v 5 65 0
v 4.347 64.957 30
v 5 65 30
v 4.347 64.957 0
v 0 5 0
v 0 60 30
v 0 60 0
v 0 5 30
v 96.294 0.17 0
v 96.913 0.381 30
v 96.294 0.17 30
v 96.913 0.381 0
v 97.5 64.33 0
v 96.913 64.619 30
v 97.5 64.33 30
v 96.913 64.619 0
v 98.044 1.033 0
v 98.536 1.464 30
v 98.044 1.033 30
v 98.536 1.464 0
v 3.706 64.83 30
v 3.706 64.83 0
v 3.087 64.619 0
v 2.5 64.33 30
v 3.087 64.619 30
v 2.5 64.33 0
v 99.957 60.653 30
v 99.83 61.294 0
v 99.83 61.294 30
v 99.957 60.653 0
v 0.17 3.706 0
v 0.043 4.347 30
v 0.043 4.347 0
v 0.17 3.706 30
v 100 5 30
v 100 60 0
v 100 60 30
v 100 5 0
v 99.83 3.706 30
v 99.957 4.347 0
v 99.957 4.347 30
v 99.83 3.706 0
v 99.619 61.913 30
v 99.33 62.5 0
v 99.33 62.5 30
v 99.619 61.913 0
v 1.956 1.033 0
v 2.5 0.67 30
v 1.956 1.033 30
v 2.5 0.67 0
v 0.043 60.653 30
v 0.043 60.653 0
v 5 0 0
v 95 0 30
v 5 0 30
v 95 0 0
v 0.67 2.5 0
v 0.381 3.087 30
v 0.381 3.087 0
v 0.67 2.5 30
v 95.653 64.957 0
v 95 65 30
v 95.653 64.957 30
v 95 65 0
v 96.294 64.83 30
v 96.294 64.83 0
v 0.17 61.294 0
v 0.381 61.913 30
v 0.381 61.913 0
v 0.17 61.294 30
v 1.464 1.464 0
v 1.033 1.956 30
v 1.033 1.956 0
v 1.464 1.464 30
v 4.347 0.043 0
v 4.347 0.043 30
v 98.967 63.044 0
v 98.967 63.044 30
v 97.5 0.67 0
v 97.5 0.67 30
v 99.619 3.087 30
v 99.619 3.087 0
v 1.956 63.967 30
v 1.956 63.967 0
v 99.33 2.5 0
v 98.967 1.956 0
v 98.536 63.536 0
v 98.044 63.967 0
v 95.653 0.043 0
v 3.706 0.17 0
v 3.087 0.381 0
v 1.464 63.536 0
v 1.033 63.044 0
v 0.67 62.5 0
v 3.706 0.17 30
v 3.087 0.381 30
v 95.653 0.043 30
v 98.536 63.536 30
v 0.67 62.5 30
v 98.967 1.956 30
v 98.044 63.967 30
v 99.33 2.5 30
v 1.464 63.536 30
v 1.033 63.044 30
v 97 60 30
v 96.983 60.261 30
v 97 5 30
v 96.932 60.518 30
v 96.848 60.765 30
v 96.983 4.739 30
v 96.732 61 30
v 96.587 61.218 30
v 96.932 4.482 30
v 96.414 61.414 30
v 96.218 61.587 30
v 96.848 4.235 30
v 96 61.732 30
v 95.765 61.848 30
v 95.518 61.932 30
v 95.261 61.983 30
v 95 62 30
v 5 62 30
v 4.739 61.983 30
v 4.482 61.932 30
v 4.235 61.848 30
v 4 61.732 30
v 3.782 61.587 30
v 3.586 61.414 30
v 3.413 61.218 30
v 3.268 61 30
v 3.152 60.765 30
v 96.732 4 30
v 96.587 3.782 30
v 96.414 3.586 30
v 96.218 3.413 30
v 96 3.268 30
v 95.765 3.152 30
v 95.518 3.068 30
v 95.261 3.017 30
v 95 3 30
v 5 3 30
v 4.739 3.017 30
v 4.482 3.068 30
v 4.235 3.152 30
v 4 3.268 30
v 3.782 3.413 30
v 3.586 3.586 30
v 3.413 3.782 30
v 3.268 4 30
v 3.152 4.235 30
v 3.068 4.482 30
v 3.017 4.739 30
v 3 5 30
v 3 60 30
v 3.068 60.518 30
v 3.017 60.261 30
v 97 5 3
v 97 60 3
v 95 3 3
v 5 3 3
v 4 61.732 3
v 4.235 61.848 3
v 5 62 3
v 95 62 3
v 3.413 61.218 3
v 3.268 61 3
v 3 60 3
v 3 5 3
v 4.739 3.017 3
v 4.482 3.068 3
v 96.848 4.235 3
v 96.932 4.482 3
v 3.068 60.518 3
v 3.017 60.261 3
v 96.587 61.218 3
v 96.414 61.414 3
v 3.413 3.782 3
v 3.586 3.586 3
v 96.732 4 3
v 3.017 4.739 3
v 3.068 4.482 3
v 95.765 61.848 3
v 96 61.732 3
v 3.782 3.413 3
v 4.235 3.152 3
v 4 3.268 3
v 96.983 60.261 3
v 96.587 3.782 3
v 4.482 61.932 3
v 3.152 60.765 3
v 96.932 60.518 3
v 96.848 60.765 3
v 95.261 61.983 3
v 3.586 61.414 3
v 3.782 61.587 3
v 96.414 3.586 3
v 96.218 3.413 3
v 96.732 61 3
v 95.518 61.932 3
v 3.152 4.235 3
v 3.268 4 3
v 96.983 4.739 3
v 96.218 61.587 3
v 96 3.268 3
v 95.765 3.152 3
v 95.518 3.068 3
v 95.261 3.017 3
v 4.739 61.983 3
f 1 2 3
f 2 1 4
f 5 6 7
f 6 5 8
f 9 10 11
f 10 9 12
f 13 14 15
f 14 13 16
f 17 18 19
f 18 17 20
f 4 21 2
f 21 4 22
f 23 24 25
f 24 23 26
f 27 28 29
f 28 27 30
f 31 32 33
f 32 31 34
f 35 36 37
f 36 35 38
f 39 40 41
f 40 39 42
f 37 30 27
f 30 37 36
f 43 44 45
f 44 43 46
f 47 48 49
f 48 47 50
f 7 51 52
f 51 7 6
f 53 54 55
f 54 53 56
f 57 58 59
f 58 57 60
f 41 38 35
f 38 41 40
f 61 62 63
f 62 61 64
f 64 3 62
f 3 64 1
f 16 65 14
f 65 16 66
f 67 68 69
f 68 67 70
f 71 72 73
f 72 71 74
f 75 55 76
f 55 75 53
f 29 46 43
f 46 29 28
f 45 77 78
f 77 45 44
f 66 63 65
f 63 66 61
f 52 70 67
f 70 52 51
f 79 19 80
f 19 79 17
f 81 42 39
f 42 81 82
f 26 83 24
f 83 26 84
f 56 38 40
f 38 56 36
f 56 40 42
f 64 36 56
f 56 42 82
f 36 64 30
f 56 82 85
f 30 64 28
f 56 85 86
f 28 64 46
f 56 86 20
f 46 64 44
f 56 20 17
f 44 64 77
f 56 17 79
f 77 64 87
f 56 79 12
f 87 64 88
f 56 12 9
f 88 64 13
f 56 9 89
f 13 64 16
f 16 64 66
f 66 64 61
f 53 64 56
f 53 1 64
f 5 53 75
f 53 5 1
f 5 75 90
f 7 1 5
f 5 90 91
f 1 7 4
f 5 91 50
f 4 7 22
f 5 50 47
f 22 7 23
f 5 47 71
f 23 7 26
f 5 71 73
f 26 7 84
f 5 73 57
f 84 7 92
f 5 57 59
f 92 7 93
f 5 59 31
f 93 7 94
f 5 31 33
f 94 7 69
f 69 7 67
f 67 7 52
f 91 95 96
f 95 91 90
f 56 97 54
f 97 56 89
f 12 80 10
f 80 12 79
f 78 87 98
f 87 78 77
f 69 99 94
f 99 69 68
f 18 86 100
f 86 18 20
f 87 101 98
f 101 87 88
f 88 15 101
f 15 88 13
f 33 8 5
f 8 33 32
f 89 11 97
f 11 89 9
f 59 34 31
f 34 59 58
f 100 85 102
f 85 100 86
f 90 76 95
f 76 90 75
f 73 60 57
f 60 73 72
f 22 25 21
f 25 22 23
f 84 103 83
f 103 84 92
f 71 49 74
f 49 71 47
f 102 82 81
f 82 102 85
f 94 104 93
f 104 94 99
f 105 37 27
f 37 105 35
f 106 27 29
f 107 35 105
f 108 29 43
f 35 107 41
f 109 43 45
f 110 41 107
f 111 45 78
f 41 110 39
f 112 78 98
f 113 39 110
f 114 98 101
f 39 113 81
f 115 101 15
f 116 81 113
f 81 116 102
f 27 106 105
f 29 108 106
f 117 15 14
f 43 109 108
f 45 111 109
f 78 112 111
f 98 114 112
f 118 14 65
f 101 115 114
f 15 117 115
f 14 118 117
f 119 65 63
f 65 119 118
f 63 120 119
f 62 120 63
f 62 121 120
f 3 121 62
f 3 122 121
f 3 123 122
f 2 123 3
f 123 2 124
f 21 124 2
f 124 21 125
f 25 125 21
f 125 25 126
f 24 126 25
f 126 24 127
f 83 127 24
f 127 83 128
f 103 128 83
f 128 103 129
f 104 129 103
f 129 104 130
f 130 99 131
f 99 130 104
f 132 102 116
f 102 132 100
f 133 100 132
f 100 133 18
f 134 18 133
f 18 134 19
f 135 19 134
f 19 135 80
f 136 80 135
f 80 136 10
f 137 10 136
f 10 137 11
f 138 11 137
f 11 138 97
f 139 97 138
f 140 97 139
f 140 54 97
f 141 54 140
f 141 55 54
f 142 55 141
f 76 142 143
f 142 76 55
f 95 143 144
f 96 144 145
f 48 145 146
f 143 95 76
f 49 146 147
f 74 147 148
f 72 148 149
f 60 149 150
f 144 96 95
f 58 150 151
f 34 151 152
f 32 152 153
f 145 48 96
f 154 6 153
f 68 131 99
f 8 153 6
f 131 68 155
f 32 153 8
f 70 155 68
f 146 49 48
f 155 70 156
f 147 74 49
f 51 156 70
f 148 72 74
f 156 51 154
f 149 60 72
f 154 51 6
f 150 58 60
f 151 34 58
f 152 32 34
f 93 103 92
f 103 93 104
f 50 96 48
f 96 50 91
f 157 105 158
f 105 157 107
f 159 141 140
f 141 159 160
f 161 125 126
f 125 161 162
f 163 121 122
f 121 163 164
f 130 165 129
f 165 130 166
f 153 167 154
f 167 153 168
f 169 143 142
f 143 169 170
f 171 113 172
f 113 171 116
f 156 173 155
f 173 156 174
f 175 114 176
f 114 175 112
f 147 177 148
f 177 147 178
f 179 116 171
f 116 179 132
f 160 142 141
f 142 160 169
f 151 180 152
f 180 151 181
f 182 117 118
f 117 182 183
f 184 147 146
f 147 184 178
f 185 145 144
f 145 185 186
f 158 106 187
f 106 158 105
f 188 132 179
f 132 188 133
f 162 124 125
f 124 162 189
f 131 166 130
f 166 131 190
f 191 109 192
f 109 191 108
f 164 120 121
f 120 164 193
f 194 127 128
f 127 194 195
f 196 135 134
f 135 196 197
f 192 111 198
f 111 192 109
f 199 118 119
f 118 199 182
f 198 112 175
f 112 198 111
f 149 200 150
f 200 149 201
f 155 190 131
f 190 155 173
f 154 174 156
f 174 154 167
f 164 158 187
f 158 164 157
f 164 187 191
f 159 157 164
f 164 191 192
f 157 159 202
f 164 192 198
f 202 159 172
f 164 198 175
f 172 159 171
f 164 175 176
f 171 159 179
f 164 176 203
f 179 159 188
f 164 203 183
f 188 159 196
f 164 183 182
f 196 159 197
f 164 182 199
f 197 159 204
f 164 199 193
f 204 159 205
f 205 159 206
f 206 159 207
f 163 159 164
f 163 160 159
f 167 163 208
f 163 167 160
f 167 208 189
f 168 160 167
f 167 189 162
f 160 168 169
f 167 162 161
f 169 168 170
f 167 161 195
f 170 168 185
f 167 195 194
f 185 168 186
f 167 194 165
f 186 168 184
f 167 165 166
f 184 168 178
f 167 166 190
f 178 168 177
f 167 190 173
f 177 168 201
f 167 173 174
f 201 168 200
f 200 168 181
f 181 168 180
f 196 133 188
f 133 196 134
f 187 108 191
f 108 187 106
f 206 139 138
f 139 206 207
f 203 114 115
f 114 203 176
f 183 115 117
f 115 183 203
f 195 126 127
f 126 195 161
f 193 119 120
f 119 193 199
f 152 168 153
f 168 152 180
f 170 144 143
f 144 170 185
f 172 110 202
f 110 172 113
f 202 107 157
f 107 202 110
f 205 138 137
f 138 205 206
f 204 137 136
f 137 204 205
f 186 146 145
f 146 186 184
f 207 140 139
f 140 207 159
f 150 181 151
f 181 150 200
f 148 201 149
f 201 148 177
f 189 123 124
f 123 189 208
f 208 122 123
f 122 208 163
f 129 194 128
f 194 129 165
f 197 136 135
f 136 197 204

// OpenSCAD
// ScadLatch starter: a rounded electronics shell.
// Select the right wall, add an opening, then change width.
width = 100;
depth = 65;
height = 30;
wall = 3;
radius = 5;
$fn = 48;

module rounded_body(w, d, h, r) {
  hull()
    for (x = [r, w-r], y = [r, d-r])
      translate([x, y, 0]) cylinder(r=r, h=h);
}

difference() {
  rounded_body(width, depth, height, radius);
  translate([wall, wall, wall])
    rounded_body(width-2*wall, depth-2*wall, height, radius-wall);
}
